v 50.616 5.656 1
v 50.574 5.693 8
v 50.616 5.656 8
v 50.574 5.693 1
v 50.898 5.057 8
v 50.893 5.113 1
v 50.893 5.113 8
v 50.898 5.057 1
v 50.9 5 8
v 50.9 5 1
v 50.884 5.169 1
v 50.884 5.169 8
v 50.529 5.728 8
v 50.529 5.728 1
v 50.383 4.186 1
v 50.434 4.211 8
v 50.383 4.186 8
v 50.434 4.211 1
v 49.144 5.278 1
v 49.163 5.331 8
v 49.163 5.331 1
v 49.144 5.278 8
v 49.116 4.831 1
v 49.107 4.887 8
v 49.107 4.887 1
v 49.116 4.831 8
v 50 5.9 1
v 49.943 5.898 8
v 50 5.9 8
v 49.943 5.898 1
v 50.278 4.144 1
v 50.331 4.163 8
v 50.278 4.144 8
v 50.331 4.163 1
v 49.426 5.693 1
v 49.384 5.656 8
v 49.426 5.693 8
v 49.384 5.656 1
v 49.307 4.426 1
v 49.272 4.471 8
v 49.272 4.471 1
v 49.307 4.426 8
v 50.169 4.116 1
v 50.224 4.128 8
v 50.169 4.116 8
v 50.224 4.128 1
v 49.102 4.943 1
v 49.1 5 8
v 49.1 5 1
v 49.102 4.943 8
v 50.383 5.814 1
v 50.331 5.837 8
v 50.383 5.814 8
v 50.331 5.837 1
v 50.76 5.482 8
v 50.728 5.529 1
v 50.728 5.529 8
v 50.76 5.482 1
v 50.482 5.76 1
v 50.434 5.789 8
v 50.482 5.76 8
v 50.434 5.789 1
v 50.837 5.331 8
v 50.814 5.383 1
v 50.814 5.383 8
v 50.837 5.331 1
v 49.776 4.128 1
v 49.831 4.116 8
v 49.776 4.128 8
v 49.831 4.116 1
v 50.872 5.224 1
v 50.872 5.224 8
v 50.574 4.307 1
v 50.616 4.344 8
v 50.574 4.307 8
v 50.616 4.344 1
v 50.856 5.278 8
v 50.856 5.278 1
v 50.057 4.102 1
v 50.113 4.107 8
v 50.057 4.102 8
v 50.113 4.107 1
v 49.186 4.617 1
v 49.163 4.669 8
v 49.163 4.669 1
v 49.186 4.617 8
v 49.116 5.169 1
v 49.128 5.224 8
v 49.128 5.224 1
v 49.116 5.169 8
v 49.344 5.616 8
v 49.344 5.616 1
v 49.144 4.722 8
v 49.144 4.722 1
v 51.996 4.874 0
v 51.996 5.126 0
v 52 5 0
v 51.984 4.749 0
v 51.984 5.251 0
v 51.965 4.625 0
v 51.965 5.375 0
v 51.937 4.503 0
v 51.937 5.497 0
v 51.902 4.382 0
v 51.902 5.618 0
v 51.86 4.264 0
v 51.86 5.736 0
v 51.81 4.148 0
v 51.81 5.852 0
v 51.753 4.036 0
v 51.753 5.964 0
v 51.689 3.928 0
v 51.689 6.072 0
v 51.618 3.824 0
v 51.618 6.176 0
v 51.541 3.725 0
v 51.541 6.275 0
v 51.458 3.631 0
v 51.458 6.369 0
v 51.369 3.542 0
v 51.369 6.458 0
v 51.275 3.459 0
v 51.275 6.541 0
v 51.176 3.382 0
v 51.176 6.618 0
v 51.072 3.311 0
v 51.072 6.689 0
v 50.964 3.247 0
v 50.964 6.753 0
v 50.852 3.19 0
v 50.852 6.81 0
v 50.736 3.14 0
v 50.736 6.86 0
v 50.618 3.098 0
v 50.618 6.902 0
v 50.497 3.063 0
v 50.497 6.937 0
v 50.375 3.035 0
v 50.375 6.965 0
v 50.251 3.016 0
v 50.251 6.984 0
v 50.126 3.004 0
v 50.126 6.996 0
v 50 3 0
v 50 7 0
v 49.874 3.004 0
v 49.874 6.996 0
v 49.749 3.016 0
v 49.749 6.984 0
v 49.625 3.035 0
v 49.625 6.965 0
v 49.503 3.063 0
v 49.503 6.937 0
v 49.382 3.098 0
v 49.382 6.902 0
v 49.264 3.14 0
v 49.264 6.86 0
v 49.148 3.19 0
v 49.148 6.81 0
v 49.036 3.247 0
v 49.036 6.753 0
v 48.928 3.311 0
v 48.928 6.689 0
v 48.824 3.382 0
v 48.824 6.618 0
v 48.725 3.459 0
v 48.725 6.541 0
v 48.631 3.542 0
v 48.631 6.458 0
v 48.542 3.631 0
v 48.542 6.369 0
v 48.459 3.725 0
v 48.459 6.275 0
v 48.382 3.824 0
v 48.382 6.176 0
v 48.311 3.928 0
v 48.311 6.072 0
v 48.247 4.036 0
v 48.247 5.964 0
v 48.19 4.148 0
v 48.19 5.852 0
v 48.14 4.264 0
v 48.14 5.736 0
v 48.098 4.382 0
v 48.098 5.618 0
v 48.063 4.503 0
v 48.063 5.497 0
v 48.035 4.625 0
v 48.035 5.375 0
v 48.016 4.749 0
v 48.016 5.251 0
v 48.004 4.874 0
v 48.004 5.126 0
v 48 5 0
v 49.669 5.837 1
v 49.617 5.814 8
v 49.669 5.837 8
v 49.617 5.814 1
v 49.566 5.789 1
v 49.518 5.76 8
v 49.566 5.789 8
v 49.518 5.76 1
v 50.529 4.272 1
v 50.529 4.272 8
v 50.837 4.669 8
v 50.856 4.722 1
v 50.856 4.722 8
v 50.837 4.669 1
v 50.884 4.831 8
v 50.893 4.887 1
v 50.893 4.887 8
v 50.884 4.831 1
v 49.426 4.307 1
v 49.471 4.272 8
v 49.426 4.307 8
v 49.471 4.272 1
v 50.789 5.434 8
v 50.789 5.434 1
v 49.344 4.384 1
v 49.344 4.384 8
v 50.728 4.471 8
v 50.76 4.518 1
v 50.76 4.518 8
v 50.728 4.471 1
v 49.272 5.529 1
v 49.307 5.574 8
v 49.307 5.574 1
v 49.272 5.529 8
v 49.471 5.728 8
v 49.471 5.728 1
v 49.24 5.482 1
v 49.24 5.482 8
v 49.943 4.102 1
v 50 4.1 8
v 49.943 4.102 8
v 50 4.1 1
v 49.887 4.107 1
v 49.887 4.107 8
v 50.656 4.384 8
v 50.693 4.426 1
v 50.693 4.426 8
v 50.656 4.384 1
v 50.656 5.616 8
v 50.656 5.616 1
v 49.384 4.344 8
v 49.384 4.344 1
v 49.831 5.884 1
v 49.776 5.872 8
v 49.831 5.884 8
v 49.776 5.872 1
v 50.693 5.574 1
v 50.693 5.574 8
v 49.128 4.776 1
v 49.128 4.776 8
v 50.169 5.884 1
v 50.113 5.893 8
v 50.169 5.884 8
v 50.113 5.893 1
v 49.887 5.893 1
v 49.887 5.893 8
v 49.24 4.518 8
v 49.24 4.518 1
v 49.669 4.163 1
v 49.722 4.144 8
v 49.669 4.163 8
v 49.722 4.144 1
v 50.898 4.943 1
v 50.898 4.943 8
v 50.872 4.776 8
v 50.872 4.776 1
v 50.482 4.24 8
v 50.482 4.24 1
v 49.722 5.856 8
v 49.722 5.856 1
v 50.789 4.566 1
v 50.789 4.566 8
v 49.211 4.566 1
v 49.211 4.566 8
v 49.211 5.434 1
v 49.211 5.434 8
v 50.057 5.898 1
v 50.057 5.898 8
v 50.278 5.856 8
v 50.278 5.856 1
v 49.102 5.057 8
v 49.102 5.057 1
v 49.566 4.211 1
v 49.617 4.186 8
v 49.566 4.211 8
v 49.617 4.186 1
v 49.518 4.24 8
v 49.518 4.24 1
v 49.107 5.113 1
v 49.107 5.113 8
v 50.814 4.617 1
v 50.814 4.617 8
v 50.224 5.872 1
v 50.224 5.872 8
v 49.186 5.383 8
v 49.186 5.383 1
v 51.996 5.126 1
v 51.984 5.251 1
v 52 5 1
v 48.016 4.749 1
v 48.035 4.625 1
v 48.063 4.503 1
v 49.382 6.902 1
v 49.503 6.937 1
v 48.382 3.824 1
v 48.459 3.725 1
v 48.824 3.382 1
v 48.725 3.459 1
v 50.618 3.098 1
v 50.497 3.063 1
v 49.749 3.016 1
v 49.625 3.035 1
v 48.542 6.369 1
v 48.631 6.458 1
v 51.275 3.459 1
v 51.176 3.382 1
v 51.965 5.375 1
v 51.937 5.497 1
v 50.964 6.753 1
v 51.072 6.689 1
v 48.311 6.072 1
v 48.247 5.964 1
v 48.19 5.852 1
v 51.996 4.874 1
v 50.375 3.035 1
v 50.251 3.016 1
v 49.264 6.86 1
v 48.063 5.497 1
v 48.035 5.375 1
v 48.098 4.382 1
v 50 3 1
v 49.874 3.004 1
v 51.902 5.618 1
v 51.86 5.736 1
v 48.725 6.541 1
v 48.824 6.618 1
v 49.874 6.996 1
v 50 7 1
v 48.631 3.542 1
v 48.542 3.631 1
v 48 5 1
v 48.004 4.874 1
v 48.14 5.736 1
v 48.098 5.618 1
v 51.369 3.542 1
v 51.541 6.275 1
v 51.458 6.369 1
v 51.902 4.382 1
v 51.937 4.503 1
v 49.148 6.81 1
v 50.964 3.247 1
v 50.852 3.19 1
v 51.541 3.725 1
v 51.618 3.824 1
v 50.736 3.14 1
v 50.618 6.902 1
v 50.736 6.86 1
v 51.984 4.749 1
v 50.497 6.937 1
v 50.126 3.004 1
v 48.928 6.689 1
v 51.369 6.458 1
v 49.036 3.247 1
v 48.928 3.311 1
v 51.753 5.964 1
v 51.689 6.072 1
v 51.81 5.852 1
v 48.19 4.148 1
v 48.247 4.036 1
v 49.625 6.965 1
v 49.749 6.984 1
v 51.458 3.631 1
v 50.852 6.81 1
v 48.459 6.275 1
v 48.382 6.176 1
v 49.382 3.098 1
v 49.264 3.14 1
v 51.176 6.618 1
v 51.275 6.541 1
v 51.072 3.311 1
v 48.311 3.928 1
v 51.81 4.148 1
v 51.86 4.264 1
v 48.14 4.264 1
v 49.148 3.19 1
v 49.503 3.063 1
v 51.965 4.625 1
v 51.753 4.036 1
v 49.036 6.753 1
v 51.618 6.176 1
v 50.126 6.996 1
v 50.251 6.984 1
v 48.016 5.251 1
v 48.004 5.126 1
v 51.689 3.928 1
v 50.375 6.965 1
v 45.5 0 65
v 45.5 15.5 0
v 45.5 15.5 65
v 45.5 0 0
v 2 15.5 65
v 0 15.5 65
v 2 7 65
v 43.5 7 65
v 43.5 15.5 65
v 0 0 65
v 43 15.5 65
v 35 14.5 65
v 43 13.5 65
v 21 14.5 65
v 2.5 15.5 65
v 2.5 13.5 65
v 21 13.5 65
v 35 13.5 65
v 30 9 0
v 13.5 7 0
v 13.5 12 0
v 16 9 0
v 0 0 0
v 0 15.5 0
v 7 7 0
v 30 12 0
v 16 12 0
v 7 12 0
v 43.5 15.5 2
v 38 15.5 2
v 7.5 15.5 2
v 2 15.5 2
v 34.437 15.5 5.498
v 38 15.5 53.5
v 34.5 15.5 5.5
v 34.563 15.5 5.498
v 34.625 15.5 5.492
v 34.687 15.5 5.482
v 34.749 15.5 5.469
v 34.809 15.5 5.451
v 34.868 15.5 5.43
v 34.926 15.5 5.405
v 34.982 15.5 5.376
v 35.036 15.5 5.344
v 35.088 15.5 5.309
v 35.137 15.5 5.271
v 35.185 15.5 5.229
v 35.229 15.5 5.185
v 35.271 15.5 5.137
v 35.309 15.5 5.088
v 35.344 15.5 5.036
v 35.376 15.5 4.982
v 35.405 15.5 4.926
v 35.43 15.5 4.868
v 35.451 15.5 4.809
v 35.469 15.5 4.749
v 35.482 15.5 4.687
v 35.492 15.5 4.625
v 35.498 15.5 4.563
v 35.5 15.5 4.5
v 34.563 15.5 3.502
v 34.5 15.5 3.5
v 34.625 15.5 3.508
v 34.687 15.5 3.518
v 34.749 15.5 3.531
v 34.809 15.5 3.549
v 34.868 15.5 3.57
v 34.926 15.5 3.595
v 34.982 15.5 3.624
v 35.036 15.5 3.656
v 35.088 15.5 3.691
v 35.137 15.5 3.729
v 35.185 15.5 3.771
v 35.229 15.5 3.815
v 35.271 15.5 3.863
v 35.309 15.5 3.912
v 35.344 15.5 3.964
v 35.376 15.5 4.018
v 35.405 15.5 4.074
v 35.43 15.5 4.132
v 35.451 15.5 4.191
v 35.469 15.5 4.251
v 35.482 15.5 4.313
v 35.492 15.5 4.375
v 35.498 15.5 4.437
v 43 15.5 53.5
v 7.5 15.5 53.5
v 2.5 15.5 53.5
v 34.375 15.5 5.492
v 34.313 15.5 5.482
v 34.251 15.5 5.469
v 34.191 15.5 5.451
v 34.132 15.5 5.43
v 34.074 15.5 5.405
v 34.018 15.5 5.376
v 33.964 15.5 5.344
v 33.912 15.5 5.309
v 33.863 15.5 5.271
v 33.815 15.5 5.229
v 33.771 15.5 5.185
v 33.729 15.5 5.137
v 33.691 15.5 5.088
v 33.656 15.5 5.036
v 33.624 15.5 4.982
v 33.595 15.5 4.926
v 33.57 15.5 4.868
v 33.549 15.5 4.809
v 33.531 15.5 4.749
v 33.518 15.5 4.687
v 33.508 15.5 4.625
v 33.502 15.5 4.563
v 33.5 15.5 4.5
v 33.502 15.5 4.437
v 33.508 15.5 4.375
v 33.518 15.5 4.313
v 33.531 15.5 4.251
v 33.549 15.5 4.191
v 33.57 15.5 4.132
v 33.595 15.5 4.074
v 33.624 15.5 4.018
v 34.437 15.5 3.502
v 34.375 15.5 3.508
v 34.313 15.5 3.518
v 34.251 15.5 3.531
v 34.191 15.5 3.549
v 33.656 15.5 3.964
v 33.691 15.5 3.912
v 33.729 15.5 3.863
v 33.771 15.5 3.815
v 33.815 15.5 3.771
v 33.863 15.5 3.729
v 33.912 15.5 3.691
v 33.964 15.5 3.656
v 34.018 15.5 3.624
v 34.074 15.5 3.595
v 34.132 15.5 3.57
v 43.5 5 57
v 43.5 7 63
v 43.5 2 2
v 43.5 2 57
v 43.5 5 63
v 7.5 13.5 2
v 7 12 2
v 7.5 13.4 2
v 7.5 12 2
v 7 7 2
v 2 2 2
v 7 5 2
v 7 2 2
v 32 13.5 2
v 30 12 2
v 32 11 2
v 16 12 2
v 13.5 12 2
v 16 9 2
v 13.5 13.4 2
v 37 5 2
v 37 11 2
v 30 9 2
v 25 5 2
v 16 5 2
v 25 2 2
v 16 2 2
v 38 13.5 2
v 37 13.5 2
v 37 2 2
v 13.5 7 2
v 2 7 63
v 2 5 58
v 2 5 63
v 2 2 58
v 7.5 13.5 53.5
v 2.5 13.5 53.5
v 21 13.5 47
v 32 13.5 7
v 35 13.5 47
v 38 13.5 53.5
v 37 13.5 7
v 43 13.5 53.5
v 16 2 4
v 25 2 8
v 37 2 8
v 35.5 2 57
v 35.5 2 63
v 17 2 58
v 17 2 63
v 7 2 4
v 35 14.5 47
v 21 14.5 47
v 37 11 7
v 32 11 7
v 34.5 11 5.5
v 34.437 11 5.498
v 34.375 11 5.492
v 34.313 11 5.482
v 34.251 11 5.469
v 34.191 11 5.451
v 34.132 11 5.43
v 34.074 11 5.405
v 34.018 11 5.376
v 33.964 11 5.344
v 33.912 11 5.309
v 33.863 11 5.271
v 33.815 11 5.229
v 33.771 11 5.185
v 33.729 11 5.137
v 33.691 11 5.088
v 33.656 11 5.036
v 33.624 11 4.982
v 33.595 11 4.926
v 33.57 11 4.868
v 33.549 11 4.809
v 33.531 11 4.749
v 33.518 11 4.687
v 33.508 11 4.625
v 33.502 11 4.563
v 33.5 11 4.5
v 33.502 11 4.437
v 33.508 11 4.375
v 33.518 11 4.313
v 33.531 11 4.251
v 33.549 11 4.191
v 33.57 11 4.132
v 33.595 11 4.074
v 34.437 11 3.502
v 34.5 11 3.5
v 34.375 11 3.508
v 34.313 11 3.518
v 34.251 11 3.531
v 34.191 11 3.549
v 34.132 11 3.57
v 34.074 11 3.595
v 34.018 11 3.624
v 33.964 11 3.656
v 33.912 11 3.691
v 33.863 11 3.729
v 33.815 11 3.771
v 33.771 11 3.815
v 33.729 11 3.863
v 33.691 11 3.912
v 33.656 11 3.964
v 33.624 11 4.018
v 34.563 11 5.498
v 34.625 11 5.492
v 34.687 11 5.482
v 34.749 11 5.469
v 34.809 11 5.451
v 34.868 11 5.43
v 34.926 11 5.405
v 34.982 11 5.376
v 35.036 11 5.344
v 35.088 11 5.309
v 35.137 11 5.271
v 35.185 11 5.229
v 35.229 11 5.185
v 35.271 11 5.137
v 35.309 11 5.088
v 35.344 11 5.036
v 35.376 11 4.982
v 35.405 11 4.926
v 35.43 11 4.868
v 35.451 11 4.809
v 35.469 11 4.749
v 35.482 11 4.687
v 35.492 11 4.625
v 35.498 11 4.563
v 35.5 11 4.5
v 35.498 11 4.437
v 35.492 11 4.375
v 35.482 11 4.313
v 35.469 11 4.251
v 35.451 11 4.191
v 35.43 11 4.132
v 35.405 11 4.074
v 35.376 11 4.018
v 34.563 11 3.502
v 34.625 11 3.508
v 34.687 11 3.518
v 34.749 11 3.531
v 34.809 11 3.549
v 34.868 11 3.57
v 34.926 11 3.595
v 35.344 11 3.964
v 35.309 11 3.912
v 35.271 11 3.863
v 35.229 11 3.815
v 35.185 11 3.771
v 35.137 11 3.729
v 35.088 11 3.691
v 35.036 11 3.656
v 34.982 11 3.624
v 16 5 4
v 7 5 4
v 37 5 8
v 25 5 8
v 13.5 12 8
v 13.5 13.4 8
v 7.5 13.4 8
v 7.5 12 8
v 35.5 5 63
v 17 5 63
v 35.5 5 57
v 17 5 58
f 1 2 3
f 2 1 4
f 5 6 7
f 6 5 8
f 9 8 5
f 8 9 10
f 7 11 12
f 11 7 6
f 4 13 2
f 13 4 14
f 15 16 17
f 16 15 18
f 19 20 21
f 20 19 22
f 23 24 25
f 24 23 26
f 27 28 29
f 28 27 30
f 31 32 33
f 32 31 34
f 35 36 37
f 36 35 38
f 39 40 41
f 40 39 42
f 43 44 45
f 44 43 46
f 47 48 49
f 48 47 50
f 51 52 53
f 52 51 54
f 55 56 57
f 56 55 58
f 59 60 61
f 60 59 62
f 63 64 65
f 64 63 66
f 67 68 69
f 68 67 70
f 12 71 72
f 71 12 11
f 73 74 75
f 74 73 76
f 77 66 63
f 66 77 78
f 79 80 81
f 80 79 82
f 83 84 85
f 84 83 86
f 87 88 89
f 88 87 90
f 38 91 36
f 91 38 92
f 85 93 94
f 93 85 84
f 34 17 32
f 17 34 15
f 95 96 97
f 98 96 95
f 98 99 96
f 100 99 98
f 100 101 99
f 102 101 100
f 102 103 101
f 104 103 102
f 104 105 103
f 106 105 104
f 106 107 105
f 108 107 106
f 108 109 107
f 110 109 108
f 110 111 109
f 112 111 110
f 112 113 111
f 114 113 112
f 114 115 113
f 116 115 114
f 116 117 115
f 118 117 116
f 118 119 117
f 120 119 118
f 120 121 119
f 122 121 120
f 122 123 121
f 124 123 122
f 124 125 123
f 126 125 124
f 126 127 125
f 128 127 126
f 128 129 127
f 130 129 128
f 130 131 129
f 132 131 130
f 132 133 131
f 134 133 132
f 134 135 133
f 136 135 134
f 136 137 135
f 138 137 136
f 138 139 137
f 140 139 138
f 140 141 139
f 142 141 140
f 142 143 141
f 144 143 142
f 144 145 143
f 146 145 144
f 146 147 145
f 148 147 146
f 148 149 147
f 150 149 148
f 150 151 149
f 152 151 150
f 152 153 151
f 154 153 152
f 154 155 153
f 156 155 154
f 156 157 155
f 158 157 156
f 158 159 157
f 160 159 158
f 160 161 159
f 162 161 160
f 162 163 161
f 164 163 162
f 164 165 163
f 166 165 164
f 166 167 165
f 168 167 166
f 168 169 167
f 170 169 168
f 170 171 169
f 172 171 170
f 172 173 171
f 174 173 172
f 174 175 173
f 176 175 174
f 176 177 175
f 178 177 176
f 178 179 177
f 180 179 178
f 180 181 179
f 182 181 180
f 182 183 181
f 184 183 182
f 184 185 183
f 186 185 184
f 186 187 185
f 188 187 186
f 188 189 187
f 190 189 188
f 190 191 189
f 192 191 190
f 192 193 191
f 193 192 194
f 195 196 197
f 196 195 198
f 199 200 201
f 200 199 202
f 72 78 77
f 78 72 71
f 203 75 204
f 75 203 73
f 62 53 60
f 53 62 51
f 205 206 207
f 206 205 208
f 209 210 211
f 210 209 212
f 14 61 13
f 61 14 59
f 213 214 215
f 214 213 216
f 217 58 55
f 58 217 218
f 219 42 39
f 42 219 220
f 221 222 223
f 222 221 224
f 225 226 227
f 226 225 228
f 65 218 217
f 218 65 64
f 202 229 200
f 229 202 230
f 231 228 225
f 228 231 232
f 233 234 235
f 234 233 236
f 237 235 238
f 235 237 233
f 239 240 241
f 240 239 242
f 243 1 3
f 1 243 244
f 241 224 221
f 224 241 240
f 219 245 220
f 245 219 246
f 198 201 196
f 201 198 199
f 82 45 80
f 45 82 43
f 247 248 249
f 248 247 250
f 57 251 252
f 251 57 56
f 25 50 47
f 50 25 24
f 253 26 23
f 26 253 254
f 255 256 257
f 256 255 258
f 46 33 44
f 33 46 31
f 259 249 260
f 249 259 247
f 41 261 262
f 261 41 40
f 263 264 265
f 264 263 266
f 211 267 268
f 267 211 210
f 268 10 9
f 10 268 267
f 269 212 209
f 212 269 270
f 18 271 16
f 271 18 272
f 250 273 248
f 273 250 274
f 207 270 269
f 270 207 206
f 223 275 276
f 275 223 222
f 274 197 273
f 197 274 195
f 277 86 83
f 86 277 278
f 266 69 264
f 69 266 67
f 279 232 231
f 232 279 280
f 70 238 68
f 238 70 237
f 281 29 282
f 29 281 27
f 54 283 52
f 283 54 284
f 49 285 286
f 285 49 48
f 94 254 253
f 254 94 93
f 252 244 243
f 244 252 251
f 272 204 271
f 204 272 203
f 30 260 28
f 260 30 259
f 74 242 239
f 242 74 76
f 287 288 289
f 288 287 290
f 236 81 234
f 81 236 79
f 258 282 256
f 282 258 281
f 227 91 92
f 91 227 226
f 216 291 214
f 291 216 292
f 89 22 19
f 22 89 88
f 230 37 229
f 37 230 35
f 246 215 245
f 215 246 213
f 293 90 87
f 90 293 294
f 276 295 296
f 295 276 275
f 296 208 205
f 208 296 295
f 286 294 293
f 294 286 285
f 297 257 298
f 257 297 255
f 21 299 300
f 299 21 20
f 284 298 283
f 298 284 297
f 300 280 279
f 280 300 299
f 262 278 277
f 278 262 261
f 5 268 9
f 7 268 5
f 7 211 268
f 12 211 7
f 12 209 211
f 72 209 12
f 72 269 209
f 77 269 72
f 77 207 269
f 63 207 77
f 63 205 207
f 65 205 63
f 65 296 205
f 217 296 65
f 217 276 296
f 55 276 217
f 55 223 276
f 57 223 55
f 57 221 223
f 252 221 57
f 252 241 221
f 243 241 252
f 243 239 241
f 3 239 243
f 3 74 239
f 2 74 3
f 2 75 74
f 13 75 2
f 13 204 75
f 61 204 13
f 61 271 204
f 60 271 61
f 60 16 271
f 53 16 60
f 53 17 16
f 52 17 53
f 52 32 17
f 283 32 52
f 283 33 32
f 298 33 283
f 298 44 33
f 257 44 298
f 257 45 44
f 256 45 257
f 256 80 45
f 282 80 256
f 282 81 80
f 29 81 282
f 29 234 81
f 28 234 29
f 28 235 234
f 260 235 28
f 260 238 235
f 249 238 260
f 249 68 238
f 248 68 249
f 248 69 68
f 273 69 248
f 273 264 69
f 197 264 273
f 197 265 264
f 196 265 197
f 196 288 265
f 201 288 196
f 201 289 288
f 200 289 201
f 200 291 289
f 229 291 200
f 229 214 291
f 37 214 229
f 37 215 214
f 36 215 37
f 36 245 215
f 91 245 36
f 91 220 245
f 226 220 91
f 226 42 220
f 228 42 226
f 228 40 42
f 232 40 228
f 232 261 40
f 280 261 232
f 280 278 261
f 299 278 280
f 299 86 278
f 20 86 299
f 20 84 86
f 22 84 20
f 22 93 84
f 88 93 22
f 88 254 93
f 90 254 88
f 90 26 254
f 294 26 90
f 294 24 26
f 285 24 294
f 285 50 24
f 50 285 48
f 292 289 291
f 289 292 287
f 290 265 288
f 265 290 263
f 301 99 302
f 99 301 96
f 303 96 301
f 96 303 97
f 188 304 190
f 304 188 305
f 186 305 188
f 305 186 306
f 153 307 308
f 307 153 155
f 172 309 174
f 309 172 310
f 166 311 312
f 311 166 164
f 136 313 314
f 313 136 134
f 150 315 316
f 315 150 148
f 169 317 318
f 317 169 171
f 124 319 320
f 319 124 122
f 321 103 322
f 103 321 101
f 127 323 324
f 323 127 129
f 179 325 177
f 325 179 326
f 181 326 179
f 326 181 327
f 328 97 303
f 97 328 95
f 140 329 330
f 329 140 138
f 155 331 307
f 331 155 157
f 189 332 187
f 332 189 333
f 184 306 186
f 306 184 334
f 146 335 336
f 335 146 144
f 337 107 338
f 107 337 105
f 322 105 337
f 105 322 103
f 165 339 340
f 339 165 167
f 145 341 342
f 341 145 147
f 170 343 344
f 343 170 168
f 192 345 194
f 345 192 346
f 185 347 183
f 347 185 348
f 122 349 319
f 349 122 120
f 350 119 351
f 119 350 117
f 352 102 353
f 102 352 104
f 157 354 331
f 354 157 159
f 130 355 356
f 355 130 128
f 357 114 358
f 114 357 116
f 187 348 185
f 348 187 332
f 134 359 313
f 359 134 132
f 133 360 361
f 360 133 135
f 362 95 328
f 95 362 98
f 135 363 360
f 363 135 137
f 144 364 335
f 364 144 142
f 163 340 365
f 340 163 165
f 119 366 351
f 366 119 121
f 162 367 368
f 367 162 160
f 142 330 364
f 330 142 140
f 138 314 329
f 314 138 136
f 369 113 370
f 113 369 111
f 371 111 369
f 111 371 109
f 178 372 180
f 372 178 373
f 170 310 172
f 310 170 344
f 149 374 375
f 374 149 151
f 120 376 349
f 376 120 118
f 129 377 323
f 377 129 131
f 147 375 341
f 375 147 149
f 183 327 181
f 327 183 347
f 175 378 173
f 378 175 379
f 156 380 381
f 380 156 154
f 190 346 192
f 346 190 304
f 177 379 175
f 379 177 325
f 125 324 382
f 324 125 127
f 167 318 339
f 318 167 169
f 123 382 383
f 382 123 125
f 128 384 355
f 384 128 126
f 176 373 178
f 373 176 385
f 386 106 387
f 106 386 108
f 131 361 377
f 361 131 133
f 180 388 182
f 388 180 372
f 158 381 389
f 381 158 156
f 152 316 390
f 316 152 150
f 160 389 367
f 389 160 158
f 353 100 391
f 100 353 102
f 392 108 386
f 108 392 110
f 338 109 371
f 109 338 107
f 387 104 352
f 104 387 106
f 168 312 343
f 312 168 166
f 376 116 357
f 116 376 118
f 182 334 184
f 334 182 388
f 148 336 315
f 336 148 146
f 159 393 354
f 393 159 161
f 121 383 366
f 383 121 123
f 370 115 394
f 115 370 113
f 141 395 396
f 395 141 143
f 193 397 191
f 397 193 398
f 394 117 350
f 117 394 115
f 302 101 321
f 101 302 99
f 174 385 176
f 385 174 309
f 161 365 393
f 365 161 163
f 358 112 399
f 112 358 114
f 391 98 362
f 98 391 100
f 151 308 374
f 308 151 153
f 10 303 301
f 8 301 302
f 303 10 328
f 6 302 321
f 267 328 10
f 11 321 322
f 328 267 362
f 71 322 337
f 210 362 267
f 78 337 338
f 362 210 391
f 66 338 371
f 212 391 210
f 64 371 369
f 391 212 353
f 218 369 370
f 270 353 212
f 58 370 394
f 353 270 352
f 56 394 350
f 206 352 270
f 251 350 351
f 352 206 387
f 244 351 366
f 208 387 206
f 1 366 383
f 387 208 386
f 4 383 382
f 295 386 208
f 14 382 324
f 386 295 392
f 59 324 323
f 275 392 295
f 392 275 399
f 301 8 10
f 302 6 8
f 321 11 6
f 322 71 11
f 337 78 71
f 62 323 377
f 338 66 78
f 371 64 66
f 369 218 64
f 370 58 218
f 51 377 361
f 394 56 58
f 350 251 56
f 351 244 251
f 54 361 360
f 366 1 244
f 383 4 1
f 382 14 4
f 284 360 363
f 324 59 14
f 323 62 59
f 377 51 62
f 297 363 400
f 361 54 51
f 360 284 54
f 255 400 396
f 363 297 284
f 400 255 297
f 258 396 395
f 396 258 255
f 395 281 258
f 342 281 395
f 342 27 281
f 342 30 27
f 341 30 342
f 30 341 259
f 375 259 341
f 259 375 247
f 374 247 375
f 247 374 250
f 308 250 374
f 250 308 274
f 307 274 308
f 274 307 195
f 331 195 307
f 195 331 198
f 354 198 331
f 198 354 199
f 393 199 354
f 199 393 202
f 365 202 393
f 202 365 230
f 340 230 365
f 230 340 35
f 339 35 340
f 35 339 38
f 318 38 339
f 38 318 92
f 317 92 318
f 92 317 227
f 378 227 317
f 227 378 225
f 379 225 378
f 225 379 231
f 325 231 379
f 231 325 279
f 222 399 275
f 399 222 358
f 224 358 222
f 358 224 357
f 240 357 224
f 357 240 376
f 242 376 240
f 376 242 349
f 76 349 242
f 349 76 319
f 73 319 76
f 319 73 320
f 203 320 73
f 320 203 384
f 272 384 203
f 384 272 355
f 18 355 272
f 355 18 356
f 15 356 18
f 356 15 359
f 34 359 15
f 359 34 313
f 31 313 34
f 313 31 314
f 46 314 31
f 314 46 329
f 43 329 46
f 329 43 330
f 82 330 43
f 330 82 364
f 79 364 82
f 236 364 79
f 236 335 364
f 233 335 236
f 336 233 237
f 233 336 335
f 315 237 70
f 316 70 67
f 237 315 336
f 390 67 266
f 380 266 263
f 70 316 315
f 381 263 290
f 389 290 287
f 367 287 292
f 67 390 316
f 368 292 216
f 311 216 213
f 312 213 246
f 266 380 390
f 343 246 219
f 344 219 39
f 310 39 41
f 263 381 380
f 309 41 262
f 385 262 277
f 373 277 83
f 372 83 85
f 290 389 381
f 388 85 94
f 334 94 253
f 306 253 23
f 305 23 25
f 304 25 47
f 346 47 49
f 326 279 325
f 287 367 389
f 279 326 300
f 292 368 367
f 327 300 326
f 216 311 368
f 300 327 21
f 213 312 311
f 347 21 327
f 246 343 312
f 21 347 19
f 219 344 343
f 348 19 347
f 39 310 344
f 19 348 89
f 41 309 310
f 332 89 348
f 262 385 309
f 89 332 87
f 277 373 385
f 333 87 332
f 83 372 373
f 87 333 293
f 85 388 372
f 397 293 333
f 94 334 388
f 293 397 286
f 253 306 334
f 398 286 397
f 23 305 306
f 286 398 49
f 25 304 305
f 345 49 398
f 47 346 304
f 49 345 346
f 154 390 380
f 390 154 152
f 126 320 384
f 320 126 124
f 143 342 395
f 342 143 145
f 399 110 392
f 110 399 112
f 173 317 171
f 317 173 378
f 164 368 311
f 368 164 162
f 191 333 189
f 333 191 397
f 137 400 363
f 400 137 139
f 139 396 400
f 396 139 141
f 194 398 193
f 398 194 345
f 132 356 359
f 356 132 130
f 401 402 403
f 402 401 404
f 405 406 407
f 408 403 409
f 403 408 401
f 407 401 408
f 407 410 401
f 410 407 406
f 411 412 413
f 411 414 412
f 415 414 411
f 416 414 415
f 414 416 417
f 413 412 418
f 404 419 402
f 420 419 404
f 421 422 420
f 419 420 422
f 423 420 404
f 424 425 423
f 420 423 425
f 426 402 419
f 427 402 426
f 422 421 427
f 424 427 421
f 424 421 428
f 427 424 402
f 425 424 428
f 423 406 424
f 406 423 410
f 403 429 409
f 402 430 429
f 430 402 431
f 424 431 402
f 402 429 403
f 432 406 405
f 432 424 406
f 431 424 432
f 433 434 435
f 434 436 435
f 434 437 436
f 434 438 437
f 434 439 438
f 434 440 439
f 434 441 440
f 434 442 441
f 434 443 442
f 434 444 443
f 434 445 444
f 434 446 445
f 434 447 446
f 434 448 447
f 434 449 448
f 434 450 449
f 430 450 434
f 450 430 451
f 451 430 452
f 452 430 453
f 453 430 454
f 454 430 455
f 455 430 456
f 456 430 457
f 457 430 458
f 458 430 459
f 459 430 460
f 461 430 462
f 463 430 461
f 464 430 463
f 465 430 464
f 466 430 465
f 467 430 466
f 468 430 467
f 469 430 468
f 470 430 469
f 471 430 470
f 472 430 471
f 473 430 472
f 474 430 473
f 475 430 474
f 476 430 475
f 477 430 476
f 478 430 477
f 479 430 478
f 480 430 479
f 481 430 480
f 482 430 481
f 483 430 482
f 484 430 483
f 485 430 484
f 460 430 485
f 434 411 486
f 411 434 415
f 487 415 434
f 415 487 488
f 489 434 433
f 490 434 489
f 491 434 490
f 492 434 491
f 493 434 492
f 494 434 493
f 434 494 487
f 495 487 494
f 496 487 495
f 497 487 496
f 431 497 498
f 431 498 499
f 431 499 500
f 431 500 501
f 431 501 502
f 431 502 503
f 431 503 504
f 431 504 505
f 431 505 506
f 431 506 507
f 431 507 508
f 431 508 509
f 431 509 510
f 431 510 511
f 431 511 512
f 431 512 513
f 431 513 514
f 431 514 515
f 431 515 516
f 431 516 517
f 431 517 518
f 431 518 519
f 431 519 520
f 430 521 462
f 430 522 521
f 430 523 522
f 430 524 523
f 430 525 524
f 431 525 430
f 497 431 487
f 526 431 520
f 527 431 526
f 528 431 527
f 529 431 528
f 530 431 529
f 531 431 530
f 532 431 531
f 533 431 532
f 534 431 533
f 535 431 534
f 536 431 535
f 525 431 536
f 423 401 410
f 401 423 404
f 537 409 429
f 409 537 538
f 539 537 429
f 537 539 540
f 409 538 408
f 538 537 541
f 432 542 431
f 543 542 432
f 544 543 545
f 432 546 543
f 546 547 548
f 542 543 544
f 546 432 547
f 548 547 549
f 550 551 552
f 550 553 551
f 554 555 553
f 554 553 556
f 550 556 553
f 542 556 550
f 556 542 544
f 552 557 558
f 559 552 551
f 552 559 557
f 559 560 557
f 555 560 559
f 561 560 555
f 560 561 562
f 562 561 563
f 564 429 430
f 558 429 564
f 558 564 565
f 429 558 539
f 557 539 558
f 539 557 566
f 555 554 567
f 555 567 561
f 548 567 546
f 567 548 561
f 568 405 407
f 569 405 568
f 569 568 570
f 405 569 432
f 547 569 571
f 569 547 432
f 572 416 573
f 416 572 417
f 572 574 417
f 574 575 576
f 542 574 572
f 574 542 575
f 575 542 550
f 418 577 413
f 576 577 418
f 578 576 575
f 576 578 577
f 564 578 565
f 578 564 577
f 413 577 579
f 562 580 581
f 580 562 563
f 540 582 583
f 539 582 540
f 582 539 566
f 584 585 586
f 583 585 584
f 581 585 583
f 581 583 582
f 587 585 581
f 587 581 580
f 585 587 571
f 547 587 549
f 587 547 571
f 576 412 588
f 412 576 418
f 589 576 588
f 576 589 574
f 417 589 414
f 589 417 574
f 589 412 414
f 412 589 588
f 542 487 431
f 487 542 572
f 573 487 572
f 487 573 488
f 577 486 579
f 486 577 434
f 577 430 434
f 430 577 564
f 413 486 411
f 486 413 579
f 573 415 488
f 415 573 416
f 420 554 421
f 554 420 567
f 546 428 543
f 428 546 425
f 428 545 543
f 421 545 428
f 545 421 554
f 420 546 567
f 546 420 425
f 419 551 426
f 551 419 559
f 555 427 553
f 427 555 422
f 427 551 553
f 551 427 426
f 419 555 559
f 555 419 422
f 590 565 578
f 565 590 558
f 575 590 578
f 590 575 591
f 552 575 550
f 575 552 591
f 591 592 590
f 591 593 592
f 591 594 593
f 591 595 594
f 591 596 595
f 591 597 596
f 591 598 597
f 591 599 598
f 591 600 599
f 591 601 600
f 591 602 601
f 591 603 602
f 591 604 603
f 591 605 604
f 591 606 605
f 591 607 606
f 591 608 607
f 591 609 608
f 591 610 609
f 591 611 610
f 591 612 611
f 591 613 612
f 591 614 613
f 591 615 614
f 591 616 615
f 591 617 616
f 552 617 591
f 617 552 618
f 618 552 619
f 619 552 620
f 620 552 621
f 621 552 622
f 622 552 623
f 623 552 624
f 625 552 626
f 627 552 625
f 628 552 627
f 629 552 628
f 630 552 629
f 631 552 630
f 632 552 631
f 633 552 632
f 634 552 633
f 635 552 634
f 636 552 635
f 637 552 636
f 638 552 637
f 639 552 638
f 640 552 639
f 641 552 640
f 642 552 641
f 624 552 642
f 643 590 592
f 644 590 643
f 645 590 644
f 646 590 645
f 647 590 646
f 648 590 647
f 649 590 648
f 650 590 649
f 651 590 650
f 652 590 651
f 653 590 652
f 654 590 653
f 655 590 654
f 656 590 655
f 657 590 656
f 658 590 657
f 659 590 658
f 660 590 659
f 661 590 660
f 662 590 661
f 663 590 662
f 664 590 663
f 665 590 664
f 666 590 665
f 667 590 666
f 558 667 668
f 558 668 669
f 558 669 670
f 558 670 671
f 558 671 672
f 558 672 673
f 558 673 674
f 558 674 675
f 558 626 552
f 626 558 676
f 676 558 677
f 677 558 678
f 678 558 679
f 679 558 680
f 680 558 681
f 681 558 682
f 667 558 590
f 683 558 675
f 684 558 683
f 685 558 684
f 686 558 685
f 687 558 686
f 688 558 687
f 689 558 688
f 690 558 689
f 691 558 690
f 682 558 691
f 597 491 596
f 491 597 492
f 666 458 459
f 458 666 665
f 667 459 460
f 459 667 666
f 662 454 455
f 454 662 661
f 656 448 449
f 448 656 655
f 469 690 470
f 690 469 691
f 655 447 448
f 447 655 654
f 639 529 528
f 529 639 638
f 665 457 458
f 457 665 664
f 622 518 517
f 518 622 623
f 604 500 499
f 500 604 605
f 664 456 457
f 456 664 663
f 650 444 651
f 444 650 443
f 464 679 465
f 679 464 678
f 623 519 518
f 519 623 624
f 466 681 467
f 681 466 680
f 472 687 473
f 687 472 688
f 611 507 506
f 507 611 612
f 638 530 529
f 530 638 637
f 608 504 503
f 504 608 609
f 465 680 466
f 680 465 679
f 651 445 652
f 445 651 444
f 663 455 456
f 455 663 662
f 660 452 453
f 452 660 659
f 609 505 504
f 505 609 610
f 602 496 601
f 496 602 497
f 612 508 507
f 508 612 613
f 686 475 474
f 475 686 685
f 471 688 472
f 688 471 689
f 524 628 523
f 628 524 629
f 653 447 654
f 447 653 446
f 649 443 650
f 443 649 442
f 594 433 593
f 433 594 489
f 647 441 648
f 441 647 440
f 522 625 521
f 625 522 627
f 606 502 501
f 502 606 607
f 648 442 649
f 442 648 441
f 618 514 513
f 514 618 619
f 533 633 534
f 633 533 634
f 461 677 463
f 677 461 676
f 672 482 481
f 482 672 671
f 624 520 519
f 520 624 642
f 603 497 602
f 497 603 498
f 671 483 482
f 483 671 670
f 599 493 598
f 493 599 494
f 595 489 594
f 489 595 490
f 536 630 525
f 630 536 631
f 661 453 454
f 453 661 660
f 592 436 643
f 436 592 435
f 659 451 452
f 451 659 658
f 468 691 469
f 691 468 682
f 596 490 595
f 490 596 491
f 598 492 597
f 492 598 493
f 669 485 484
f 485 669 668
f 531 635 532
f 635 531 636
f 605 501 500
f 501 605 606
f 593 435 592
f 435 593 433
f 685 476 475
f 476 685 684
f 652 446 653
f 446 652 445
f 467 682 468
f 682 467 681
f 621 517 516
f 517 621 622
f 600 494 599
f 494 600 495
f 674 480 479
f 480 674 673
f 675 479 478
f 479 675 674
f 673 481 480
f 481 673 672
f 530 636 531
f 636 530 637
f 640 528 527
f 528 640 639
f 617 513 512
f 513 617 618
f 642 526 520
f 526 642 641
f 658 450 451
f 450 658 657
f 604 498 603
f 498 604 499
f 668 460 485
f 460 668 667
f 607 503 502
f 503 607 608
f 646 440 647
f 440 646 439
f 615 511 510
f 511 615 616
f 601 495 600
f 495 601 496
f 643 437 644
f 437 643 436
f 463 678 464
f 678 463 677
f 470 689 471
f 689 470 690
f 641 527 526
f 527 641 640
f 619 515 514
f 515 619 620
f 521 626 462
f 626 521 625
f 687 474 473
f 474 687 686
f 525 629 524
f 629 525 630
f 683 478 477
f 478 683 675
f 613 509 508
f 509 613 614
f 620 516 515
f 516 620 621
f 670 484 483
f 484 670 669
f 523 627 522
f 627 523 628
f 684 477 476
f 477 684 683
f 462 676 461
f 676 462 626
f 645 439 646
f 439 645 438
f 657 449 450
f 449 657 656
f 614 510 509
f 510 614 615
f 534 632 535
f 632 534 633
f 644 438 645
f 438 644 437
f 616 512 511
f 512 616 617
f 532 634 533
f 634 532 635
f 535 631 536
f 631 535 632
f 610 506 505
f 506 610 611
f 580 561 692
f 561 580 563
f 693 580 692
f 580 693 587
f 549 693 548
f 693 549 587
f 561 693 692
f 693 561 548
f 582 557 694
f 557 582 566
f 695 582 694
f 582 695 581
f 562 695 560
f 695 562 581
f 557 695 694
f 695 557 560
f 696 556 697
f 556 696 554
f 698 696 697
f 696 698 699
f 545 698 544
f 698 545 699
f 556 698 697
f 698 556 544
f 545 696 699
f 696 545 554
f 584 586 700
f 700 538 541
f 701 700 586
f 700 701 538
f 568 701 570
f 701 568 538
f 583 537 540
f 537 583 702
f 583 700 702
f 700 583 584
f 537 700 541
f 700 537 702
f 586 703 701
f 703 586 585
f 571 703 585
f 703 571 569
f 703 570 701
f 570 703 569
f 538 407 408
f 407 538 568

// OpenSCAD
union(){    // hmatnik na tlacidlo
	translate([ 50, 5, 4])   
cylinder (h = 8, r=0.9, center = true, $fn=100);
translate([ 50, 5, 0.5]) 
cylinder (h = 1, r=2, center = true, $fn=100);
}

//krabicka
union(){
difference(){
union(){
difference(){			//puzdro
	cube([ 45.5, 15.5, 65]);
	translate([ 2, 2, 2])
	cube([ 41.5, 11.5, 63]);
	translate([ 21, 13.5, 47])
	cube([ 14, 1, 18]);
	translate([ 2, 13.5, 2])
	cube([ 5.5, 2, 51.5]);
	translate([ 38, 13.5, 2])
	cube([ 5.5, 2, 51.5]);
	translate([ 43, 13.5, 53.5])
	cube([ 0.5, 2, 11.6]);
	translate([ 2, 13.5, 53.5])
	cube([ 0.5, 2, 11.6]);
	translate([ 7, 7, 0])
	cube([ 6.5, 5, 2]);
	translate([ 16, 9, 0])
	cube([ 14, 3, 2]);
//	translate([ 10, 1, 10])   
//	rotate ([90,0,0])cylinder (h = 2.1, r=2, center = true, $fn=100);
}

translate([ 32, 11, 2])		//kocka na tlacidlo
cube([ 5, 4.5, 5]);


}
translate([ 34.5, 14.25, 4.5])   // diera na hmatnik na tlacidlo
rotate ([90,0,0])cylinder (h = 7, r=1, center = true, $fn=100);

}	//podpery pod pcb
	translate([ 7, 2, 2])
	cube([ 9, 3, 2]);
	translate([ 25, 2, 2])
	cube([ 12, 3, 6]);
	translate([ 7.5, 12, 2])
	cube([ 6, 1.4, 6]);
//	translate([ 10, 1, 10])   
//	rootate ([90,0,0])cylinder (h = 2.1, r=2, center = true, $fn=100);
	translate([ 35.5, 2, 57])
	cube([ 8, 3, 6]);
	translate([ 2, 2, 58])
	cube([ 15, 3, 5]);
	translate([ 2, 2, 63])
	cube([ 41.5, 5, 2]);

}
